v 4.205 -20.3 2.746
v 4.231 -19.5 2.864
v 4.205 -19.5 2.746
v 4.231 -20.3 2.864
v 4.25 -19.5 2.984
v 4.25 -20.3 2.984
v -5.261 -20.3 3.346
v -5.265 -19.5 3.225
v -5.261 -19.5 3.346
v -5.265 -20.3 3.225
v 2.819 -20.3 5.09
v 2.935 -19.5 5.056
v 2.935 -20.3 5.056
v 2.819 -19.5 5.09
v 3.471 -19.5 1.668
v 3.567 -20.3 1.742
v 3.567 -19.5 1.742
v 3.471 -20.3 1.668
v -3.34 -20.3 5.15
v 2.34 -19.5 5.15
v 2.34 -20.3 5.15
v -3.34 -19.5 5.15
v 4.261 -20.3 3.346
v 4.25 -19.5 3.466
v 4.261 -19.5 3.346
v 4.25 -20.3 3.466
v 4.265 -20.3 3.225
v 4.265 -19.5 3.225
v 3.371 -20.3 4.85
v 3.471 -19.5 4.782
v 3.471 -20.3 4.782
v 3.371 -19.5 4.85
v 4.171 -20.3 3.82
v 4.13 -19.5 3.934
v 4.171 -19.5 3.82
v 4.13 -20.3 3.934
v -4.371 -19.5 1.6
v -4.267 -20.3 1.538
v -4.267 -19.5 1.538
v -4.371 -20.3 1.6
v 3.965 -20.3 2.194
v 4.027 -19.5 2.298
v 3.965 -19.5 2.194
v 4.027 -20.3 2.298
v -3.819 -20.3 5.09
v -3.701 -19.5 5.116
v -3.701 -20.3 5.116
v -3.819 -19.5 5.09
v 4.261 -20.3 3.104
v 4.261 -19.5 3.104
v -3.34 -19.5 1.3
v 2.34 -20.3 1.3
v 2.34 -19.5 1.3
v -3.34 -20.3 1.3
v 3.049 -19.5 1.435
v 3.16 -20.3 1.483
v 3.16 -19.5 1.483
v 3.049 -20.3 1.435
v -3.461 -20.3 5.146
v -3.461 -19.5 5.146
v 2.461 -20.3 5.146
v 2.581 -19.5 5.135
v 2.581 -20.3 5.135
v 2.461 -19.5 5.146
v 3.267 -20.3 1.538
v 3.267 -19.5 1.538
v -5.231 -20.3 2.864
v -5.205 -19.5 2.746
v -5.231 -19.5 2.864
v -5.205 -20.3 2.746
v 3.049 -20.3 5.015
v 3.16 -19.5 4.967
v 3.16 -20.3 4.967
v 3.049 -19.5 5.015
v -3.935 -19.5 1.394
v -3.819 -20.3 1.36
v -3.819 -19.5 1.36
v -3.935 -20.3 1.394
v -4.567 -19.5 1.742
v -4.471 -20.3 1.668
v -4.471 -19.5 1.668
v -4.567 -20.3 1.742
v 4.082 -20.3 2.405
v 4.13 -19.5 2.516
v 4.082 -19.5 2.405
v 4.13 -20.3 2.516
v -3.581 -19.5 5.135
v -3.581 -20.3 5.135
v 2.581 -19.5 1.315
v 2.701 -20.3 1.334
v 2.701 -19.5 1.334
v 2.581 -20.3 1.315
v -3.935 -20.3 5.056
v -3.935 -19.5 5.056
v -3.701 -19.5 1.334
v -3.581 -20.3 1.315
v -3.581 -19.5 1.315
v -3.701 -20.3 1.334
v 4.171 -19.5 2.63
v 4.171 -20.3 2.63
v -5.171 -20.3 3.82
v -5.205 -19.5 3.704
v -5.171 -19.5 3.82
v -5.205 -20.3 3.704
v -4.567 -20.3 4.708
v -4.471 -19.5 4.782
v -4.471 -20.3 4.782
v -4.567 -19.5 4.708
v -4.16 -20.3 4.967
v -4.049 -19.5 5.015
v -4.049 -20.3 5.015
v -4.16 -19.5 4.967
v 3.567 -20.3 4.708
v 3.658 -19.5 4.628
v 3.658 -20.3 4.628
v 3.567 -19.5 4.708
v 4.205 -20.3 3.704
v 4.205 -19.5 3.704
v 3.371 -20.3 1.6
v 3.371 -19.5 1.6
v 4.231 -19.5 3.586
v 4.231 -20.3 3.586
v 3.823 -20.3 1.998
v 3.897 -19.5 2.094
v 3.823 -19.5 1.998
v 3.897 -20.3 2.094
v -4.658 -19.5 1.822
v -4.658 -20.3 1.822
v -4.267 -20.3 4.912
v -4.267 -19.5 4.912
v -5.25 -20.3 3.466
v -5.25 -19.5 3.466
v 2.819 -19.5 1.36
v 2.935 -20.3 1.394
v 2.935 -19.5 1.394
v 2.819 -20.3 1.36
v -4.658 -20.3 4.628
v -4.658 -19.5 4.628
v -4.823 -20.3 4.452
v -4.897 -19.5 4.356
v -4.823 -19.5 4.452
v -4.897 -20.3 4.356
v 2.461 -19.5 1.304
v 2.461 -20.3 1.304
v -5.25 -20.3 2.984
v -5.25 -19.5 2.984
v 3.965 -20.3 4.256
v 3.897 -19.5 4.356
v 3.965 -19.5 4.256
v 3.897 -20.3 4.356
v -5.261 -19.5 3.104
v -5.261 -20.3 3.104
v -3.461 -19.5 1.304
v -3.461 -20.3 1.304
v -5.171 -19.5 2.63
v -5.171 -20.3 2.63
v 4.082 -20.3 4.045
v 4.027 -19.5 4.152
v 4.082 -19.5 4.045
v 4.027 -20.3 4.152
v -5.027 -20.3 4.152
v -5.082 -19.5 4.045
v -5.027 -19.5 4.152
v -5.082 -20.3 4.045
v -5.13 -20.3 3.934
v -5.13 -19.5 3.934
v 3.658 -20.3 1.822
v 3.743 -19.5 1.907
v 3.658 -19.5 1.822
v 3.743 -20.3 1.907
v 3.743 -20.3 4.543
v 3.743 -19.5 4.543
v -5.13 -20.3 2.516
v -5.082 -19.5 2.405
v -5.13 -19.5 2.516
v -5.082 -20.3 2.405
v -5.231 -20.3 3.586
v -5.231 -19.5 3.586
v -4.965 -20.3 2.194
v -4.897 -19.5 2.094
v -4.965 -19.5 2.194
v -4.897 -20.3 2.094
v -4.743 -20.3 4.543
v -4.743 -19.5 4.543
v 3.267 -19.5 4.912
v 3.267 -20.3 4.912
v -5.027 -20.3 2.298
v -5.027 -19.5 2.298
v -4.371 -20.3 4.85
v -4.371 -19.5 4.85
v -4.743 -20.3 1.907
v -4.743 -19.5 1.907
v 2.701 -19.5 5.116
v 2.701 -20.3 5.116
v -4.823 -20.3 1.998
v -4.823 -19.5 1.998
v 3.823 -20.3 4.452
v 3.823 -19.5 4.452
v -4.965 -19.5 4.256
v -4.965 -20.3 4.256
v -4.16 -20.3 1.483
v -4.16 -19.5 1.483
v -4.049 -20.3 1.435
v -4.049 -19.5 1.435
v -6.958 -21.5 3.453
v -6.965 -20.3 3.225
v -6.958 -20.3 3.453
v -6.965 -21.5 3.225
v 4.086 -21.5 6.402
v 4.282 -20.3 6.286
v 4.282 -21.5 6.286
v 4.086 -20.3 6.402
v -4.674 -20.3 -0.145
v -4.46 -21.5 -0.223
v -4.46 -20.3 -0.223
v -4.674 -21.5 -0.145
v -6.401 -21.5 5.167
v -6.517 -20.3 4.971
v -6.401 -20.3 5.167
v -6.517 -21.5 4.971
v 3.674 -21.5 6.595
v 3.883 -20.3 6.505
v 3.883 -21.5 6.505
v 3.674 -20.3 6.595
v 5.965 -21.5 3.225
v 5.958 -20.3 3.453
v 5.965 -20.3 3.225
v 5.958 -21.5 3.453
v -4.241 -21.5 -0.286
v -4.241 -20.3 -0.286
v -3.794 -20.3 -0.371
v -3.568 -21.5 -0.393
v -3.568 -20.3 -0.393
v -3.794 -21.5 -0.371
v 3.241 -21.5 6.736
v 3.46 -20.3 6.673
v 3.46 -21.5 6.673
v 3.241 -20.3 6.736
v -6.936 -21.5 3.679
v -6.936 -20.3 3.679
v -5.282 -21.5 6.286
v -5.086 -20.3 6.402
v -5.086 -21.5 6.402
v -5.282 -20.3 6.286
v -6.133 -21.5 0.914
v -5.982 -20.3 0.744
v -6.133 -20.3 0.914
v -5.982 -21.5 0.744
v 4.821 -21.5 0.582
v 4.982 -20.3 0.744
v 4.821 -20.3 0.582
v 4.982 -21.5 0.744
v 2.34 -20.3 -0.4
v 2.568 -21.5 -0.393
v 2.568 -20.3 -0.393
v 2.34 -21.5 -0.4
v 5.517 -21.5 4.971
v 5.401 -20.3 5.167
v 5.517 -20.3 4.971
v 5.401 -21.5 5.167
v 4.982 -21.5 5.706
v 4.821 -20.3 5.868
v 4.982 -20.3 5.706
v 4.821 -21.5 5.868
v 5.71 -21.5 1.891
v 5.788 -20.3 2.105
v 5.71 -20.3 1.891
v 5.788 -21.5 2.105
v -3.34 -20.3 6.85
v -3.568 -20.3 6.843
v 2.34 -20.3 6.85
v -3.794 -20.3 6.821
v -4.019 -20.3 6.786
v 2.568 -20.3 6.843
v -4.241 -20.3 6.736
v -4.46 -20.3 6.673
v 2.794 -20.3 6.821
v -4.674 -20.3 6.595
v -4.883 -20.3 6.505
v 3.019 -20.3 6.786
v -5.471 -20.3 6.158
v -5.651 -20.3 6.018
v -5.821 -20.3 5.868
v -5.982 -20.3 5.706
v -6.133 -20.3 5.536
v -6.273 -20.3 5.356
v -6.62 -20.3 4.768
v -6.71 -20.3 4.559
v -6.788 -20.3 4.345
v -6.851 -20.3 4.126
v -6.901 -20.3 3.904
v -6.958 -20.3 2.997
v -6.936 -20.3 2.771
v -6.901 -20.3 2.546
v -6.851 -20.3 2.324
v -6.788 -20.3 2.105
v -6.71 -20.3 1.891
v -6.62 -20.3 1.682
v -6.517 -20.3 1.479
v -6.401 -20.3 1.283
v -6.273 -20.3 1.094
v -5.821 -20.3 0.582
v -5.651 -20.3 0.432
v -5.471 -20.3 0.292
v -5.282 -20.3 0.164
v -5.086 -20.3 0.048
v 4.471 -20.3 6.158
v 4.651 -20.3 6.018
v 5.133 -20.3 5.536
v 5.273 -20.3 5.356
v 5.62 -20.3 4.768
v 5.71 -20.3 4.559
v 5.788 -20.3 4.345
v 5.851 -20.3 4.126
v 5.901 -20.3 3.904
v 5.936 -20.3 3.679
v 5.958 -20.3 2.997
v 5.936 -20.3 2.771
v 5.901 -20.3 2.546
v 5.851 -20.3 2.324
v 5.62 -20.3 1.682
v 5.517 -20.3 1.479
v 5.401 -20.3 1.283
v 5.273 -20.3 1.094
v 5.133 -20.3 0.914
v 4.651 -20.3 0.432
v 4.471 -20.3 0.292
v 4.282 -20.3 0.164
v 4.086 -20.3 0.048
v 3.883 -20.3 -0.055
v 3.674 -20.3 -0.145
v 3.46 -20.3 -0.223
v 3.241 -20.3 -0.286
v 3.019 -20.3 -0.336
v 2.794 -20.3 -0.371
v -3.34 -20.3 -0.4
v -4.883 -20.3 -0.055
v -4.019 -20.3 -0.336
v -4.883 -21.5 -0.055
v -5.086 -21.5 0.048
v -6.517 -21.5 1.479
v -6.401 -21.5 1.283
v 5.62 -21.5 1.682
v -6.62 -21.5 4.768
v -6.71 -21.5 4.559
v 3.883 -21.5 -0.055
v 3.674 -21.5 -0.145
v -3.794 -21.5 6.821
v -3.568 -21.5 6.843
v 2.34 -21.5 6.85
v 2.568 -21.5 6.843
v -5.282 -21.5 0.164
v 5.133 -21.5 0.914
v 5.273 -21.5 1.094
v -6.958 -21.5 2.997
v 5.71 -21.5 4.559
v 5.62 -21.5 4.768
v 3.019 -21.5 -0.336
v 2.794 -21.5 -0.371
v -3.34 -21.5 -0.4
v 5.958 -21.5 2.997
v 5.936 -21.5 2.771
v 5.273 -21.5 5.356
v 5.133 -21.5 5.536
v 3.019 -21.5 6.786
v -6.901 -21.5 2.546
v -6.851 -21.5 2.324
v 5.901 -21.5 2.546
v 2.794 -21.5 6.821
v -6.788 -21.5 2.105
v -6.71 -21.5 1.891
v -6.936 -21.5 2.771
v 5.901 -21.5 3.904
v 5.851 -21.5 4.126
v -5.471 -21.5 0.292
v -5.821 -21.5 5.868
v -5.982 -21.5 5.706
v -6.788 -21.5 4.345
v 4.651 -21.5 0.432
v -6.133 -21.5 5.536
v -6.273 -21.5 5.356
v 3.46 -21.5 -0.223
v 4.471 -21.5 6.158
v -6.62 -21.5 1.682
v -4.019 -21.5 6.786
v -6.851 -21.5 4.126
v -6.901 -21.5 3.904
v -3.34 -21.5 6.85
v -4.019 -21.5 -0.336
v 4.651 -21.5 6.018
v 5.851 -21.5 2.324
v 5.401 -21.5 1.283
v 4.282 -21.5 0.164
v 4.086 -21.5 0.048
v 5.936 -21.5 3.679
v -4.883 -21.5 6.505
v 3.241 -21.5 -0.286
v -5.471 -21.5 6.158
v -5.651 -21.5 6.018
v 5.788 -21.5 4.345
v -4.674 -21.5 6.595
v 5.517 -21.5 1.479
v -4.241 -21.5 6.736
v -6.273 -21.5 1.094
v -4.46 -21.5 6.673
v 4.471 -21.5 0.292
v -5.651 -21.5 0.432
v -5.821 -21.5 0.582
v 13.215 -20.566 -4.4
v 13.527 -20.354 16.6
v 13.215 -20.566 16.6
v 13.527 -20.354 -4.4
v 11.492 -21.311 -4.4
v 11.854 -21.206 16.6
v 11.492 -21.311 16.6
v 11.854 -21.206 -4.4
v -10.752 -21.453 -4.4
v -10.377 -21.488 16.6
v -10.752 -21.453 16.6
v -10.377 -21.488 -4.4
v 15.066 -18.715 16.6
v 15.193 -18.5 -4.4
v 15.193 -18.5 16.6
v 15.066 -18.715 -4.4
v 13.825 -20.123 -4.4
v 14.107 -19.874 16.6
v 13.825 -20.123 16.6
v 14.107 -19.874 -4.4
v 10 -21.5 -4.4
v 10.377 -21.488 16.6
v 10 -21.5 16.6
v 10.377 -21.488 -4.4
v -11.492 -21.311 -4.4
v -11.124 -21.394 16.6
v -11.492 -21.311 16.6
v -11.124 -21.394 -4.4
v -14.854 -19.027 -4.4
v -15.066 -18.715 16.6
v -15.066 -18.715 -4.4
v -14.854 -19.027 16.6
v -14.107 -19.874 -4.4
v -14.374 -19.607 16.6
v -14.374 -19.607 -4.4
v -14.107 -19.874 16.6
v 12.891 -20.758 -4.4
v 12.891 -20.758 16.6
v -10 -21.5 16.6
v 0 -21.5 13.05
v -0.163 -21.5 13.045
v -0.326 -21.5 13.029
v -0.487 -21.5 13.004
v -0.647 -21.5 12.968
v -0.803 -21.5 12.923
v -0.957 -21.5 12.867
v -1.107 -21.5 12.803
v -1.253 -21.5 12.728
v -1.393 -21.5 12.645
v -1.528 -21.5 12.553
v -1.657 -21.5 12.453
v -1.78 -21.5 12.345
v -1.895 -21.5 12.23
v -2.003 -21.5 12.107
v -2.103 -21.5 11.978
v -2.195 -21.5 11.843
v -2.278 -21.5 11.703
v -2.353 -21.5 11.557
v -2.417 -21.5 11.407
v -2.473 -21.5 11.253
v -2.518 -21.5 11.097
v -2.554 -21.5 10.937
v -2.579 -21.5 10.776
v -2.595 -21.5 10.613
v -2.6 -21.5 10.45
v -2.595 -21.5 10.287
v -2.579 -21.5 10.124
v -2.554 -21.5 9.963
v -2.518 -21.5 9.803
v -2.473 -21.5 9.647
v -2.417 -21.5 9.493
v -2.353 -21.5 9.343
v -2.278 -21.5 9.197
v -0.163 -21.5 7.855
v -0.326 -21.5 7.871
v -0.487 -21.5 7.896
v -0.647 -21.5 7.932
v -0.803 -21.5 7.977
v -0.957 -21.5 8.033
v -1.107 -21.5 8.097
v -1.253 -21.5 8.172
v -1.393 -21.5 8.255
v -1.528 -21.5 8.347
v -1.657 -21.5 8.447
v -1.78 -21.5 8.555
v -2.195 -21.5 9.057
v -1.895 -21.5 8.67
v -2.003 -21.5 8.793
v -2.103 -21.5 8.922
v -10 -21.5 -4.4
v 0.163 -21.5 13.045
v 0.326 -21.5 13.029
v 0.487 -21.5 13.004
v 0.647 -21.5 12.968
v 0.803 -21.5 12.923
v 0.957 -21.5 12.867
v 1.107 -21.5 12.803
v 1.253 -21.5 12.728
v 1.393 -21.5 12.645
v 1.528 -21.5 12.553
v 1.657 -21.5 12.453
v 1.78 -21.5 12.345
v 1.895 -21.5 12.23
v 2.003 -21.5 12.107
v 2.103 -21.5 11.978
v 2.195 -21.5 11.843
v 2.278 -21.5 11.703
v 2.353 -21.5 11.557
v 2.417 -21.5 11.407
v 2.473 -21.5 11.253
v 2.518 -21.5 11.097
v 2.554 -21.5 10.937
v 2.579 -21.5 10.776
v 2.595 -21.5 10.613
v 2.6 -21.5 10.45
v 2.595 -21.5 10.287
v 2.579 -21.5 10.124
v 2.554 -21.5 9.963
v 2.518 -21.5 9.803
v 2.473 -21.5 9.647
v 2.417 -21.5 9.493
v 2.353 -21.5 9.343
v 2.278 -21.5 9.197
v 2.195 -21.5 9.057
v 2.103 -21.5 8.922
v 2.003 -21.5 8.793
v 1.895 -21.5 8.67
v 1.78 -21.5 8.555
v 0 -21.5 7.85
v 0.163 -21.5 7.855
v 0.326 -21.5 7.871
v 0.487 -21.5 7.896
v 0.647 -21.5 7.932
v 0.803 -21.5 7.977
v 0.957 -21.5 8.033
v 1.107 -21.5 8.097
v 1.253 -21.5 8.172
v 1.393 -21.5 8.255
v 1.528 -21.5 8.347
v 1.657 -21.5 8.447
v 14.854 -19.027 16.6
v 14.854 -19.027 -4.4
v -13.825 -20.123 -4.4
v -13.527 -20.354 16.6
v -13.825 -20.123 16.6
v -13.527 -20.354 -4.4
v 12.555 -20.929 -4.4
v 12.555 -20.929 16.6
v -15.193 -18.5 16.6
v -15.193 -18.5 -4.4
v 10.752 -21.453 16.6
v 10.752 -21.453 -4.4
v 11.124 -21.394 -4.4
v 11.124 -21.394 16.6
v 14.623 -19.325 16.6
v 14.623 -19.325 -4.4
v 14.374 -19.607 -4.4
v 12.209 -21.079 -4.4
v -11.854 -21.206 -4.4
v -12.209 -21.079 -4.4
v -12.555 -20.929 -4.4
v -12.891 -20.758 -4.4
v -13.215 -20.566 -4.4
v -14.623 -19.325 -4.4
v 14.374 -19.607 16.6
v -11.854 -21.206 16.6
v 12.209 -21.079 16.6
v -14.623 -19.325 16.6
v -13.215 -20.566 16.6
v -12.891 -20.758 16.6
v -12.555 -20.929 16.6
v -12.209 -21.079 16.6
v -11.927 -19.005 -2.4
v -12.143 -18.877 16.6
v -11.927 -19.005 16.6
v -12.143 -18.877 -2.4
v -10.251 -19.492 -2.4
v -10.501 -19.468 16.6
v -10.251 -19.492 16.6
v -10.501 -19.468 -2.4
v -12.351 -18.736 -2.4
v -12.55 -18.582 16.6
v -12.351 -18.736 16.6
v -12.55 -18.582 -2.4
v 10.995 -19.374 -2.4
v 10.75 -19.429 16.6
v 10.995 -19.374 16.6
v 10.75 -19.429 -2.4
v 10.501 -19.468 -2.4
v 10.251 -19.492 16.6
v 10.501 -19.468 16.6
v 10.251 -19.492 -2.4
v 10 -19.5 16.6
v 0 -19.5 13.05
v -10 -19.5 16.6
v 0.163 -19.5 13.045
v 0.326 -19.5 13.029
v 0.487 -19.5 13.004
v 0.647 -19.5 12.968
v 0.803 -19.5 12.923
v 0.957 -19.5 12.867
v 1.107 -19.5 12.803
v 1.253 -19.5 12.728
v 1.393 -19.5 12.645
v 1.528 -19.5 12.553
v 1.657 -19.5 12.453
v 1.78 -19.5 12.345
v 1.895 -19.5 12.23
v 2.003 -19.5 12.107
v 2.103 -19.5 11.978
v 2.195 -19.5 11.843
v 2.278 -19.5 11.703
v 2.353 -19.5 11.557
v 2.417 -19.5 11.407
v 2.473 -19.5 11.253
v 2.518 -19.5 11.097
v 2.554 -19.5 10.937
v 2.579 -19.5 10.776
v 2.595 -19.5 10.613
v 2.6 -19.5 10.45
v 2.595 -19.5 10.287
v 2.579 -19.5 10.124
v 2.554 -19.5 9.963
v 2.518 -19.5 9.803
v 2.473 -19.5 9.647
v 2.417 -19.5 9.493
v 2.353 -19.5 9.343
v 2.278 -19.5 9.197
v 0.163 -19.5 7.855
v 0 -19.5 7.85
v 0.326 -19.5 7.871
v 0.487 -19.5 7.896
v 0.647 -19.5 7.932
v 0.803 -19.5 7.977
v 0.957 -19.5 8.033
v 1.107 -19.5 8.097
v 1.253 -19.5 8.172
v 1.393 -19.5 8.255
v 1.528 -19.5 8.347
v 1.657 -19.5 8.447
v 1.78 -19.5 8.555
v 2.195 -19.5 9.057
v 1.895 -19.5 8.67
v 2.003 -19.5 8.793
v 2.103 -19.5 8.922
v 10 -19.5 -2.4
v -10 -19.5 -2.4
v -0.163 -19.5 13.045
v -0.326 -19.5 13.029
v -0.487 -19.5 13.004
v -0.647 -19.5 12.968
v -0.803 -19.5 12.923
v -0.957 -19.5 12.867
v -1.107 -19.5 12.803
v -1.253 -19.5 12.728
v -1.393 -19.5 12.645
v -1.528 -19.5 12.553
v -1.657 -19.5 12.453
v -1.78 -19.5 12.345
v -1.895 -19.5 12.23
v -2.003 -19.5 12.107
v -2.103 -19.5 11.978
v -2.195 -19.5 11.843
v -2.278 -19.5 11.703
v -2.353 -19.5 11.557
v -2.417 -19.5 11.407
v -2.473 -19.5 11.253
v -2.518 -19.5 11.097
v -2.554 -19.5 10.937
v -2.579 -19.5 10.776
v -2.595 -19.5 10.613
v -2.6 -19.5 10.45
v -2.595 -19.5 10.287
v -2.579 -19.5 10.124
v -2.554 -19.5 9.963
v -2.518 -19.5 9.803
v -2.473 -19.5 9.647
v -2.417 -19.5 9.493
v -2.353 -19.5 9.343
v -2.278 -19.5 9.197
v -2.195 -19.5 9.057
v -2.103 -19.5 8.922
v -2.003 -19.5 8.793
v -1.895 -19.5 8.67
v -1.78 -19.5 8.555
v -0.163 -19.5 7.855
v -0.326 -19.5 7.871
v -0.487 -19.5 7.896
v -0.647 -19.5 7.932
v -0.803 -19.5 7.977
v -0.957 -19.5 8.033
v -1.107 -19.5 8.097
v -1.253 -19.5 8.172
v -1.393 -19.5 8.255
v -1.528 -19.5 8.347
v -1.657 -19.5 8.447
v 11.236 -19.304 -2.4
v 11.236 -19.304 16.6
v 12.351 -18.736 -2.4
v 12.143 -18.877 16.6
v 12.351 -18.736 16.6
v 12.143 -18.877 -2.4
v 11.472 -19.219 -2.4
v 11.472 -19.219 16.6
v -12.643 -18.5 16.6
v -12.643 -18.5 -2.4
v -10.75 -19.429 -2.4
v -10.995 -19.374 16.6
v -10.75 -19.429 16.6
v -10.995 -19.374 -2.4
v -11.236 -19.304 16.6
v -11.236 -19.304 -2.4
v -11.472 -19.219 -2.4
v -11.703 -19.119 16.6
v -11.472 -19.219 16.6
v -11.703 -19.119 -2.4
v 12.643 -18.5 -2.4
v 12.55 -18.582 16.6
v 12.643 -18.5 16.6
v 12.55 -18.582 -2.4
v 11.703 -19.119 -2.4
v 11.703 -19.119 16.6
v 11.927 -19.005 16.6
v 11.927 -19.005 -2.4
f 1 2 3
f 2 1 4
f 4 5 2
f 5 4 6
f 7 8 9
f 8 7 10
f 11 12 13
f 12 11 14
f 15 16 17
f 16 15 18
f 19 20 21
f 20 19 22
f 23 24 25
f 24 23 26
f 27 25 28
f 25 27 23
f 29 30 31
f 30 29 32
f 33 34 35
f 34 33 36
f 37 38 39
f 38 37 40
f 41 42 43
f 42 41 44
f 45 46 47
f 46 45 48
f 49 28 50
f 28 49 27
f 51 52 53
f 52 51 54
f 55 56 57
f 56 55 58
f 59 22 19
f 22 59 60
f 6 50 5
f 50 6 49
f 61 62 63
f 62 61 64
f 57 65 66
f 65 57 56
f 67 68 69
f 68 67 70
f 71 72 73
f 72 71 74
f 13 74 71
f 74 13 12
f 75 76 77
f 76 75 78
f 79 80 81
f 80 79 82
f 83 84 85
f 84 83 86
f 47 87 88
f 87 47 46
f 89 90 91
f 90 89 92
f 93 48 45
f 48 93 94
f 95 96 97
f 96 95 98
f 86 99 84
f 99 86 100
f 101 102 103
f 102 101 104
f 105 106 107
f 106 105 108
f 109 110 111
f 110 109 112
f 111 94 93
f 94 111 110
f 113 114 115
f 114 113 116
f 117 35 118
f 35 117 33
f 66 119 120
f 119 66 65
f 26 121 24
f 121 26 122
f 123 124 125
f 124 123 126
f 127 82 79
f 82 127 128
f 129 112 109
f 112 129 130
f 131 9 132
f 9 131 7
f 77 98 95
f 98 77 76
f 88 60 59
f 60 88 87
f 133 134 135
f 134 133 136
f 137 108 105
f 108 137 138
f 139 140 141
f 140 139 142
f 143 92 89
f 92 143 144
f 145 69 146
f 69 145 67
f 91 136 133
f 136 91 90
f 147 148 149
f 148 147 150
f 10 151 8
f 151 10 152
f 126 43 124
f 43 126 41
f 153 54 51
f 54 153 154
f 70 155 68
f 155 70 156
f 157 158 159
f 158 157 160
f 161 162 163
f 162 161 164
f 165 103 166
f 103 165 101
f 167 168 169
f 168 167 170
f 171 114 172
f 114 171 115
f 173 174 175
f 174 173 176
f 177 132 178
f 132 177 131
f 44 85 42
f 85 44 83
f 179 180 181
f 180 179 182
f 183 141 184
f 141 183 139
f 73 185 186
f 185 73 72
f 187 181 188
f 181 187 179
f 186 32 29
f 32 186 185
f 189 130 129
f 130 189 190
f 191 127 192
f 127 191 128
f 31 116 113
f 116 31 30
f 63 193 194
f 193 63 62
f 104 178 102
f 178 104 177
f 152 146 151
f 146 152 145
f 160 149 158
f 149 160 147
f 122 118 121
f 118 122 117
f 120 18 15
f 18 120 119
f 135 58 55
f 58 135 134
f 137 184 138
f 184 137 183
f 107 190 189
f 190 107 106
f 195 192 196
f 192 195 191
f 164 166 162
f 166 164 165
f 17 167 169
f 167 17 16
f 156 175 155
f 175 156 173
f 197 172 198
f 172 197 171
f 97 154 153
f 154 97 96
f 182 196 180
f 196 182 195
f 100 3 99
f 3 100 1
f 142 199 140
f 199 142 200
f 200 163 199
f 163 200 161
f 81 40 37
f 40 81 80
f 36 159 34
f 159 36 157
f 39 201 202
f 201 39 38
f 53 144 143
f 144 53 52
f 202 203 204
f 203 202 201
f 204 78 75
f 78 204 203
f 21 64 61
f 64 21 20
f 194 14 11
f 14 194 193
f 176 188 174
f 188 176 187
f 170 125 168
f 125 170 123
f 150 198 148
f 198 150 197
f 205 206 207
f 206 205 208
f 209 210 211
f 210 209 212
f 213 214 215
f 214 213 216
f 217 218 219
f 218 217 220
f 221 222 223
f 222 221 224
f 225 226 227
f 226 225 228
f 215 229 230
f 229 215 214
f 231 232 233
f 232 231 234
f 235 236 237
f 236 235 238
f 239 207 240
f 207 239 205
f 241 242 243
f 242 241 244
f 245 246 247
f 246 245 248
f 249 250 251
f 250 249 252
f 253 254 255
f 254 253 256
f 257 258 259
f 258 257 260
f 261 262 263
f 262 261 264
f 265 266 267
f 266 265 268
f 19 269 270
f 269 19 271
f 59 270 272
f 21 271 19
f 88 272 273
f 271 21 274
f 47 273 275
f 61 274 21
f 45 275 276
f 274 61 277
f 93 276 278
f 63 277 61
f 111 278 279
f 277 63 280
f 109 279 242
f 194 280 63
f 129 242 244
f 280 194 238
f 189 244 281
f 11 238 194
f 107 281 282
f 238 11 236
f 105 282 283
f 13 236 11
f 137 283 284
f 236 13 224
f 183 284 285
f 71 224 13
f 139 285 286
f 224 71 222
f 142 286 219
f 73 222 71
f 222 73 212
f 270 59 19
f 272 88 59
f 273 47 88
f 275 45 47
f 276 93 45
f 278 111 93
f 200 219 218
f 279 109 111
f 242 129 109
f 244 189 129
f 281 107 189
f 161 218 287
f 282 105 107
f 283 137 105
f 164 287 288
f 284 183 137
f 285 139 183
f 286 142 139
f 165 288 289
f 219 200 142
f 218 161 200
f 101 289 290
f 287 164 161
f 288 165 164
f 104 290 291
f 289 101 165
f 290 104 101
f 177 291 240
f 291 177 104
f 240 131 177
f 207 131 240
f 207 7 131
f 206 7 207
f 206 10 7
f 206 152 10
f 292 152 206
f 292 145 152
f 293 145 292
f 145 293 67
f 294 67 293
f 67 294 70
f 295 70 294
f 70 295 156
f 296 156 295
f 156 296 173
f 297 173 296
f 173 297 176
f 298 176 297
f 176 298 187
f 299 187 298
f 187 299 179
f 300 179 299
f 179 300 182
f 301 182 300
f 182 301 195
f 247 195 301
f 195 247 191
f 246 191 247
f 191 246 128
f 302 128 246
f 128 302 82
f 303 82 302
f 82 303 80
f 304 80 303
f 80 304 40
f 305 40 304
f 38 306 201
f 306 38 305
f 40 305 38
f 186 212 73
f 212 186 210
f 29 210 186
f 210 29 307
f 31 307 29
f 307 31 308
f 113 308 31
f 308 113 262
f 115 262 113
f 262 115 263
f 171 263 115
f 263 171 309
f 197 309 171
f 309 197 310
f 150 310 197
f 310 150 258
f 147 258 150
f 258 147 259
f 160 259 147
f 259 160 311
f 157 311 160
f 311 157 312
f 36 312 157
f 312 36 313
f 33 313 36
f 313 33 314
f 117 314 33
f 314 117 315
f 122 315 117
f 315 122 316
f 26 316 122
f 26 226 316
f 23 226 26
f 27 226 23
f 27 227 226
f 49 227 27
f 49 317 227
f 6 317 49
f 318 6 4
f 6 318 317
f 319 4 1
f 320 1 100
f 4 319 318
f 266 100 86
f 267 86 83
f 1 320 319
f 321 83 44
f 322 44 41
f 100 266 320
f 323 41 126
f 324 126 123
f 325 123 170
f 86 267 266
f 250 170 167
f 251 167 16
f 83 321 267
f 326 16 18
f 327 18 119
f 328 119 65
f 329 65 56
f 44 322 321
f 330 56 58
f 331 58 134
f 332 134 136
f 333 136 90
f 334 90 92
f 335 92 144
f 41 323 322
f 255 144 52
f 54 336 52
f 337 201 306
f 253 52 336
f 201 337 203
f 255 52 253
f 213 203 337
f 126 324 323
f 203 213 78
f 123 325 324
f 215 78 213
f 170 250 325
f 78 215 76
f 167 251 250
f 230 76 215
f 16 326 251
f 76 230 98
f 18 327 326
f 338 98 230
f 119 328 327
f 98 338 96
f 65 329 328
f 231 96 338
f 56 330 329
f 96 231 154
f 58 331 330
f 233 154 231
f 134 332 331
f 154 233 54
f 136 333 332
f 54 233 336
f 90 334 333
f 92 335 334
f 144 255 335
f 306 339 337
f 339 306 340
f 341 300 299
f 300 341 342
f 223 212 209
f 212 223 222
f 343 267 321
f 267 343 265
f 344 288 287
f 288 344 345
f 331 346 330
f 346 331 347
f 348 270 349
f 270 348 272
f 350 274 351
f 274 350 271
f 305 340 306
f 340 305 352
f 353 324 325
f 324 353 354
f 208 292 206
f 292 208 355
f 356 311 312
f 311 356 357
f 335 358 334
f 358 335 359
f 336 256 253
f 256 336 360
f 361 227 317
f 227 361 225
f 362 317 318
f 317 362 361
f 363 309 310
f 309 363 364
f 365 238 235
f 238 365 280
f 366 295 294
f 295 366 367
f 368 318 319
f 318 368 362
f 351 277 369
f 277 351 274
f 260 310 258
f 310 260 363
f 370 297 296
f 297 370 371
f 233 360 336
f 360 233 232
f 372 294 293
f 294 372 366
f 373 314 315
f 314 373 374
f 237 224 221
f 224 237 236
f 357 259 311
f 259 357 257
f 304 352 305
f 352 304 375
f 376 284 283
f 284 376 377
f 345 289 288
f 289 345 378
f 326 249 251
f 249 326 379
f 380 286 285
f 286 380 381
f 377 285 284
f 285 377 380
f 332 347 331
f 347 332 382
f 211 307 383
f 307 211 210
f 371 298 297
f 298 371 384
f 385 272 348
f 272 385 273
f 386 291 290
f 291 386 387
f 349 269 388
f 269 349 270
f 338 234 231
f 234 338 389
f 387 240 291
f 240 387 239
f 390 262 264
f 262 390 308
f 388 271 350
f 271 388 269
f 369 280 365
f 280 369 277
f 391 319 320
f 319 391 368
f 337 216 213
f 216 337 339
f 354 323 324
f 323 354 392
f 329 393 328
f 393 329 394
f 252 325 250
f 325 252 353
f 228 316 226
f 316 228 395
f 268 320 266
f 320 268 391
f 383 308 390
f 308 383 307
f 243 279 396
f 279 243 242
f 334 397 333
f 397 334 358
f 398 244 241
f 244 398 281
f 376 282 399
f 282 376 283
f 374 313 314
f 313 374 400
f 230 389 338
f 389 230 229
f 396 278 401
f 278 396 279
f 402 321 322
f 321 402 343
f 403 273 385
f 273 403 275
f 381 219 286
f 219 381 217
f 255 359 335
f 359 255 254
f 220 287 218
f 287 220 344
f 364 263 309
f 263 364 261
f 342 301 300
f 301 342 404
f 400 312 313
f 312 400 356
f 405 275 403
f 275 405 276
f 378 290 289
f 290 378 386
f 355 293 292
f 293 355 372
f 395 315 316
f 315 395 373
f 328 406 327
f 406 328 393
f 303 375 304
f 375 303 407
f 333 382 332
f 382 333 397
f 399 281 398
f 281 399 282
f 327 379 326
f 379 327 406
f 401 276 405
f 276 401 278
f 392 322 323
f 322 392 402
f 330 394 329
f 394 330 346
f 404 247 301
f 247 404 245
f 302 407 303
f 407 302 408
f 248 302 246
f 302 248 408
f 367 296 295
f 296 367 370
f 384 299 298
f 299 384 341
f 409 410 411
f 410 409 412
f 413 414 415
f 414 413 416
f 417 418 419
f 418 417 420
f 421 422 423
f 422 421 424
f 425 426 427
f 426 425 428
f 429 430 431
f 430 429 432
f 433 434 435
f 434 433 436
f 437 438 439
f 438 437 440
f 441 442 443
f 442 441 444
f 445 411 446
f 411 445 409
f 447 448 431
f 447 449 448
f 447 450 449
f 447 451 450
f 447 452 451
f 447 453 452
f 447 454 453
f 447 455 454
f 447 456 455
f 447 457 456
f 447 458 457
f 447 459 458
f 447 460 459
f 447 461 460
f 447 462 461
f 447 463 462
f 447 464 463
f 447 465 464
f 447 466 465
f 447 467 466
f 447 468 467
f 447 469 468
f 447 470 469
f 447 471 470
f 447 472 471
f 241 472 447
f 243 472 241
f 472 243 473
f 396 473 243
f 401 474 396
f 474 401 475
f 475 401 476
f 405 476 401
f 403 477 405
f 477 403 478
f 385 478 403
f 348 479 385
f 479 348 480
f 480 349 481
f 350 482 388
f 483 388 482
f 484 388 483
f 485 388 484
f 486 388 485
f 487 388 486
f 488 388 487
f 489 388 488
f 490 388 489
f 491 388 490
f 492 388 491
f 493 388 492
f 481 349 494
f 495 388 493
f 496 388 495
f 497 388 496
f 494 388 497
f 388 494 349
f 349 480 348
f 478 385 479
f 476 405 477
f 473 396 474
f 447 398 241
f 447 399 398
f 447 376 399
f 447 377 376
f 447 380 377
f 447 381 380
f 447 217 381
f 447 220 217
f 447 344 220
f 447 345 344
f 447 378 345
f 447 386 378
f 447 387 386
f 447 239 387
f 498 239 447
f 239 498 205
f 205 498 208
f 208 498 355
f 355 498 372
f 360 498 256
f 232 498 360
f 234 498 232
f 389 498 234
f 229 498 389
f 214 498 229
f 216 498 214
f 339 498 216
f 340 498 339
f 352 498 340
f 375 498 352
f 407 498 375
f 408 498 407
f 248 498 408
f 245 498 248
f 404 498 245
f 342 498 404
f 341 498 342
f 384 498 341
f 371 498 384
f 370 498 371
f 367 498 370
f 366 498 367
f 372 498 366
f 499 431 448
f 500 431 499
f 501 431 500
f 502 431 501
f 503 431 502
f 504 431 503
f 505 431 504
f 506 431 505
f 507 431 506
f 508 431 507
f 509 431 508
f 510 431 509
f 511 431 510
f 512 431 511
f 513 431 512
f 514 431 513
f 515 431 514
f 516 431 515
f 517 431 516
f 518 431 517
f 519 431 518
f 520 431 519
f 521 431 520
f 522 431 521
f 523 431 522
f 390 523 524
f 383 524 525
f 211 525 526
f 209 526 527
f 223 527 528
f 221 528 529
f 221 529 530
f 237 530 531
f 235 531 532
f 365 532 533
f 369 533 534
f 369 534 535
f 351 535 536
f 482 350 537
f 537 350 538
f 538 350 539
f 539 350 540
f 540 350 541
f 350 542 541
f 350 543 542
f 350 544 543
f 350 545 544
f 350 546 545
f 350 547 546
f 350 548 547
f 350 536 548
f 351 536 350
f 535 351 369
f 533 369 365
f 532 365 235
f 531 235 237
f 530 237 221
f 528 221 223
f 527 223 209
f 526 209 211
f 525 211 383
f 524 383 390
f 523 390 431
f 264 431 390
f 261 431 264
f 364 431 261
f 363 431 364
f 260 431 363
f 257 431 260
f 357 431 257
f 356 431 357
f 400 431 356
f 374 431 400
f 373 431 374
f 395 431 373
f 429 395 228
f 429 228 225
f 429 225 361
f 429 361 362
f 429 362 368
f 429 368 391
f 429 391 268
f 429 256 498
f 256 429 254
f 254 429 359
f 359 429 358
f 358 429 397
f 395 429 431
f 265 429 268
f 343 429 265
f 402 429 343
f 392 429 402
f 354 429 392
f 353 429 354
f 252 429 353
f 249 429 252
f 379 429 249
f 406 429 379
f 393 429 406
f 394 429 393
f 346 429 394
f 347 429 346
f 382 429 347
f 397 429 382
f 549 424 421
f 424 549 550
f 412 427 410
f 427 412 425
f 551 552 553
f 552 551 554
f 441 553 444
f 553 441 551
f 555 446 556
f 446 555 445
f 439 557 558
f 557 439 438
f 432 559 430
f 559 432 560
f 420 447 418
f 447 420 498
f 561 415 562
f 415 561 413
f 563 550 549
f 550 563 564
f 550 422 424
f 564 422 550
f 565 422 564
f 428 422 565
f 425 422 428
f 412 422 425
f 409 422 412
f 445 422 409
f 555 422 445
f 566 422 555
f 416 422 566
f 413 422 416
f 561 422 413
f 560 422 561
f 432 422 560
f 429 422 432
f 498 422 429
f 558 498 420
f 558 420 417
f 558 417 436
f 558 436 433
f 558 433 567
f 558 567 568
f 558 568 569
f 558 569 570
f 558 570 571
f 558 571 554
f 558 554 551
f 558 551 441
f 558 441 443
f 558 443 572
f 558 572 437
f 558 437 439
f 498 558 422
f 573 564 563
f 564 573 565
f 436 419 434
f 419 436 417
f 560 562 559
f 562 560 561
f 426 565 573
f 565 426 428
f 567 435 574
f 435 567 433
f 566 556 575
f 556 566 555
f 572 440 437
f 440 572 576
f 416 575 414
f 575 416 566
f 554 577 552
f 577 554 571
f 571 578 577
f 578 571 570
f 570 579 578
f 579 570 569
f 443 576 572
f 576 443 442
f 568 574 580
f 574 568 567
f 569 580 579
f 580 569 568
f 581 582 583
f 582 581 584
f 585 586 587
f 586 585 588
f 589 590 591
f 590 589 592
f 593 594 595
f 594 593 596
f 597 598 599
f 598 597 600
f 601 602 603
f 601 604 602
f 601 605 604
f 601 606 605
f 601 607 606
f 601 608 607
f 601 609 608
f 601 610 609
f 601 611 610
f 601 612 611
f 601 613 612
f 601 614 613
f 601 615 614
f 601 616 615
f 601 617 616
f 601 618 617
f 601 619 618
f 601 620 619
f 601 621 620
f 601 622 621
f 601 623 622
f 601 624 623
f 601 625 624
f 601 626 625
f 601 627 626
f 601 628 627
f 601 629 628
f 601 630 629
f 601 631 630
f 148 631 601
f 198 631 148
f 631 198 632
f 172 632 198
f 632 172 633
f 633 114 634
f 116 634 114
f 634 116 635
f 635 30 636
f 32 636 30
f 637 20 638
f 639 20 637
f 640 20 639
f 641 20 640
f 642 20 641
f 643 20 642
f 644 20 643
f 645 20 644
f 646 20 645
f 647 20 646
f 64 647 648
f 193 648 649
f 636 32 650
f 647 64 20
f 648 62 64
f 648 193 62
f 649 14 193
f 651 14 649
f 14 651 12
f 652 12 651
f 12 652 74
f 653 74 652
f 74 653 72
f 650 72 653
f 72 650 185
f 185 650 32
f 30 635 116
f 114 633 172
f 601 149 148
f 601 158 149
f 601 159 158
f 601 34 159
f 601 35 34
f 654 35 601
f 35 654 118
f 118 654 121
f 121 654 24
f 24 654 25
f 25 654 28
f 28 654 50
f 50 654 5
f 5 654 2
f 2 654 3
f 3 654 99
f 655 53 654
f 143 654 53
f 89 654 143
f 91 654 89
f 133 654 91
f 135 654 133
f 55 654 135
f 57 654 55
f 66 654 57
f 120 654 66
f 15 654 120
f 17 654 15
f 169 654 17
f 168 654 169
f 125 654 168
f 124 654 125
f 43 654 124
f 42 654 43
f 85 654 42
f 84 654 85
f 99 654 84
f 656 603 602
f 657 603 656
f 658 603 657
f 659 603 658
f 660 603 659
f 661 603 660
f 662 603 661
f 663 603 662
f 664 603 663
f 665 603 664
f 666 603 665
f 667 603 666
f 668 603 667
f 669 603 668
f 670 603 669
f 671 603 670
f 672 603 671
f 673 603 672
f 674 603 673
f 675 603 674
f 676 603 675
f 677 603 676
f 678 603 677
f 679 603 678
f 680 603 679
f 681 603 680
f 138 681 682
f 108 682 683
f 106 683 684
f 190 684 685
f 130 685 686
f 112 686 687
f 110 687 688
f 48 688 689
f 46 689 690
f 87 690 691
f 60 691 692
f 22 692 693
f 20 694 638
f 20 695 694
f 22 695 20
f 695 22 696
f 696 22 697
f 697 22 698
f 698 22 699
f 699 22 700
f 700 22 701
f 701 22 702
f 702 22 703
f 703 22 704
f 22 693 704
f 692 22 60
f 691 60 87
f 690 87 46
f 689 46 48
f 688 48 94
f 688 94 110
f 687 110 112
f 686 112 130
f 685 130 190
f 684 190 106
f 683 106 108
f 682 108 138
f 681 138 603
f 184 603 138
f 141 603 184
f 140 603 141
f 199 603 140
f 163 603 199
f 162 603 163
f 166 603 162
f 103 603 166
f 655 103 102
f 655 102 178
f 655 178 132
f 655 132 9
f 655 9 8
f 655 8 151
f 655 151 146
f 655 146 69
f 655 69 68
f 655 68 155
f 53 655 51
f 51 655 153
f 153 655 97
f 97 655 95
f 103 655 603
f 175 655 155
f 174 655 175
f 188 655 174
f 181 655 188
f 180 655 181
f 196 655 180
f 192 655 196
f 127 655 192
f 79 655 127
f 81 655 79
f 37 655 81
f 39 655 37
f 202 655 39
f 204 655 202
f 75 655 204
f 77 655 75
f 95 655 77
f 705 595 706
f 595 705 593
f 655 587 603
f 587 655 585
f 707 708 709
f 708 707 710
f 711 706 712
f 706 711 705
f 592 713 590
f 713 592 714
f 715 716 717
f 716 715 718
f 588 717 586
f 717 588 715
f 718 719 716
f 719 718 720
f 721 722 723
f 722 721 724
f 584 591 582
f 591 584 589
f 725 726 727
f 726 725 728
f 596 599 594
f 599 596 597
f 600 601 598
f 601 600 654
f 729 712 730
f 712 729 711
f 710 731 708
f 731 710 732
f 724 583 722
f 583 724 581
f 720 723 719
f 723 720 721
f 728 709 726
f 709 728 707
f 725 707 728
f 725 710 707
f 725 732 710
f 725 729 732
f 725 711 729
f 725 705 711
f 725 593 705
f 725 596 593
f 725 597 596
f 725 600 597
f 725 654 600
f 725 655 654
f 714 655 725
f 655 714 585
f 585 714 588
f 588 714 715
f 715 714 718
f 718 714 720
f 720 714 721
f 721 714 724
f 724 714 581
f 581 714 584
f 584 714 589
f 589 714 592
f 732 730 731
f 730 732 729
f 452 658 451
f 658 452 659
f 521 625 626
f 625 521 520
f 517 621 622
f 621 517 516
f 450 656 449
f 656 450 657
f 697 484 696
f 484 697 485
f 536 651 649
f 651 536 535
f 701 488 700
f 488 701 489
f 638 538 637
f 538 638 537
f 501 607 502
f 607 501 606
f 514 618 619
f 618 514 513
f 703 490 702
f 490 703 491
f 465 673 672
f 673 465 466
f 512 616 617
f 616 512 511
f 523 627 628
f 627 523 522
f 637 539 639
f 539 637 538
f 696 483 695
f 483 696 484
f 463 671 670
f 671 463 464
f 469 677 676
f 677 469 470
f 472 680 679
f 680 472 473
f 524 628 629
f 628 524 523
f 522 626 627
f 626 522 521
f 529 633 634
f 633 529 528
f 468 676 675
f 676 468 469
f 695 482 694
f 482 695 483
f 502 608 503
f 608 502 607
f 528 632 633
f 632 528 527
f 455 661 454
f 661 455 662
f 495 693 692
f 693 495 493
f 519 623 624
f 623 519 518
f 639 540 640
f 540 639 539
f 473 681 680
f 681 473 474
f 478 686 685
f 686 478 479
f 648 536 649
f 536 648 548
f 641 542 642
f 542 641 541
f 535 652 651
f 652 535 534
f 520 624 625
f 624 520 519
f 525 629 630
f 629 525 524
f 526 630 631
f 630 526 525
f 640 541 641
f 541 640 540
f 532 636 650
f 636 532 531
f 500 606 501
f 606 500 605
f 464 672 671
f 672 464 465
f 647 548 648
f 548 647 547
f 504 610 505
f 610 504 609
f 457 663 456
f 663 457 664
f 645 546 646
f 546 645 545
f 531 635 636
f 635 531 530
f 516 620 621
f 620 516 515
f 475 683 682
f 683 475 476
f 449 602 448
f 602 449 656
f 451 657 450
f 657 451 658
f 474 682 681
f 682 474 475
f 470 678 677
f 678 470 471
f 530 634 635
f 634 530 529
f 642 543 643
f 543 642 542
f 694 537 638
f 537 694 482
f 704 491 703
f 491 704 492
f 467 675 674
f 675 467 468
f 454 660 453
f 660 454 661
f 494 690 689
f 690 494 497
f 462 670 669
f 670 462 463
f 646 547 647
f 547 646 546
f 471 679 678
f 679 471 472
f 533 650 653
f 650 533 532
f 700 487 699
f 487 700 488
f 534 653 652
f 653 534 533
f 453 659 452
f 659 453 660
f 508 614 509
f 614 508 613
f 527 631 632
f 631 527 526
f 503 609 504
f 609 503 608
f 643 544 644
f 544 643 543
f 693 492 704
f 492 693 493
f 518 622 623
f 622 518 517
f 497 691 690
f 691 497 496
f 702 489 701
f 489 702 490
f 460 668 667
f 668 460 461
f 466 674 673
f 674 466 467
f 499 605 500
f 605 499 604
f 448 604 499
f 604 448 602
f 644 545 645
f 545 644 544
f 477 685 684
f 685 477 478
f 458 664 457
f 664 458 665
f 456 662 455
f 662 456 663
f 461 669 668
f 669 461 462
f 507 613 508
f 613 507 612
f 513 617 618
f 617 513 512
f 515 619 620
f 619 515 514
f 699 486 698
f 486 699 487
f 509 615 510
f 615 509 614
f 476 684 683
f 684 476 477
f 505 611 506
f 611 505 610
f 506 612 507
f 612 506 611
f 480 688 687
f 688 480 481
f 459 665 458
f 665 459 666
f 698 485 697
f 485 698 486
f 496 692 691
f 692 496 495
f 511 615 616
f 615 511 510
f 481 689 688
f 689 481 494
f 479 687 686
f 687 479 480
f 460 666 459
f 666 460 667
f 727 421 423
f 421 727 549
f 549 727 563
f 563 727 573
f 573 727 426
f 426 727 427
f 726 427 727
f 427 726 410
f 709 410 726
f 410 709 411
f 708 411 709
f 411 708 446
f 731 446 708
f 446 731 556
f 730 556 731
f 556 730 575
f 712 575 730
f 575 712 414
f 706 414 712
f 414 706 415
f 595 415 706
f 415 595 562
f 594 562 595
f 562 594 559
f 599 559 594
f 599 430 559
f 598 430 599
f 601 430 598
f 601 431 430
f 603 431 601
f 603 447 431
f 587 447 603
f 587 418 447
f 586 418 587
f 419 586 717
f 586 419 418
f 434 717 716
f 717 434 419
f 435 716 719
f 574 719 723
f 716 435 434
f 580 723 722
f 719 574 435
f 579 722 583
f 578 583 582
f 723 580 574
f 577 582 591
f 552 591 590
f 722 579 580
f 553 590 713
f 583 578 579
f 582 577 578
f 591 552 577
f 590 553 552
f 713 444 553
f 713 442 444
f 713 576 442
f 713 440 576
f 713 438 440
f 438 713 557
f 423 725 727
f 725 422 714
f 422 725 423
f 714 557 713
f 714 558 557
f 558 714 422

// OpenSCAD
$fn=100;

tol=0.05; // used for CSG subtraction/addition

pcb_thickness=1.6;
height_below_pcb=1.4; // 1.32
hole_diameter=3;
hole_radius=hole_diameter/2;
pcb_radius=1.5+hole_radius;

inside_hole_width=17;
inside_hole_length=28;
center_hole_width=inside_hole_width + hole_diameter;
center_hole_length=inside_hole_length + hole_diameter;
gps_height=13;
//gps_width=26; // 25.75
//gps_length=37; // 36.5
gps_width=center_hole_width + (pcb_radius*2);
gps_length=center_hole_length + (pcb_radius*2);

usb_height=3.25;
usb_width=8.93;
usb_length=7.38;
usb_radius=usb_height/2;
usb_center_width=usb_width-usb_height;
usb_overhang=1.45;
usb_offset=0.5;
usb_hole_gap=0.3;
usb_big_hole_radius=usb_radius + 2;
usb_big_hole_offset=0.8;

enclosure_thickness=2;
enclosure_gap_to_pcb=1;
enclosure_radius_inner=pcb_radius+enclosure_gap_to_pcb;
enclosure_radius_outer=enclosure_radius_inner+enclosure_thickness;
antenna_diameter=5.2;
antenna_radius=antenna_diameter/2;
antenna_clearance=3; // space around the antenna connector

enclosure_inside_height_down=enclosure_gap_to_pcb + height_below_pcb;
enclosure_inside_height_up=pcb_thickness + usb_hole_gap + usb_height + usb_hole_gap + antenna_clearance + antenna_diameter + antenna_clearance;
enclosure_inside_height= enclosure_inside_height_up + enclosure_inside_height_down;




module flat_usb(r = usb_radius) {
    for(i=[-1,1])
        translate([i*usb_center_width/2, 0, 0])
            circle(r = r);
}
module usb(r = usb_radius) {
    rotate(90, v = [1, 0, 0])
        linear_extrude(height = usb_length, center = true)
            hull() {
                flat_usb(r);
            }
}

module rounded_rectangle_centered(radius) {
    hull() {
        for(i=[-1,1])
            for(j=[-1,1])
                translate([i*center_hole_width/2,j*center_hole_length/2,0])
                    circle(radius);
    }
}

module flat_pcb() {
    rounded_rectangle_centered(pcb_radius);
}

module pcb_no_holes() {
    translate([0,0,pcb_thickness/2])
        linear_extrude(height = pcb_thickness, center = true)
            flat_pcb();
}

module pcb() {
    difference() {
        pcb_no_holes();
        for(i=[-1,1])
            for(j=[-1,1])
                translate([i*center_hole_width/2,j*center_hole_length/2,0])
                    cylinder(h = height + tol, r = hole_radius, center=true);
    }
}

module board() {
    translate([0,0,(real_height/2)-height_below_pcb])
        cube([10, 20, real_height], center = true);
    pcb();
    translate([-usb_offset,-(length/2)+(usb_length/2)-usb_overhang,pcb_thickness+(usb_height/2)])
        usb();
}

module enclosure_flat_inner() {
    rounded_rectangle_centered(enclosure_radius_inner);
}
module enclosure_flat_outer() {
    rounded_rectangle_centered(enclosure_radius_outer);
}
module enclosure_inner() {
    translate([0,0,-(height_below_pcb + enclosure_gap_to_pcb)])
        linear_extrude(height = enclosure_inside_height /*+ enclosure_gap_to_pcb*2*/)
            rounded_rectangle_centered(enclosure_radius_inner);
}
module enclosure_outer() {
    translate([0,0,-(height_below_pcb + enclosure_gap_to_pcb + enclosure_thickness)])
        linear_extrude(height = enclosure_inside_height + (/*enclosure_gap_to_pcb +*/ enclosure_thickness)*2)
            rounded_rectangle_centered(enclosure_radius_outer);
}

module usb_hole() {
    translate([-usb_offset,-gps_length/2,pcb_thickness+(usb_height/2)])
        usb(r = usb_radius + usb_hole_gap);
    translate([-usb_offset,-gps_length/2 - (usb_length/2 + enclosure_gap_to_pcb + usb_big_hole_offset),pcb_thickness+(usb_height/2)])
        usb(r = usb_big_hole_radius);
}
module antenna_hole() {
    translate([0,-15, pcb_thickness+usb_height+antenna_clearance+antenna_radius])
        rotate(90, v = [1, 0, 0])
            linear_extrude(height = 10)
                circle(r = antenna_radius);
}

module enclosure() {
    difference() {
        enclosure_outer();
        enclosure_inner();
        usb_hole();
        antenna_hole();
    };
}

//color([0.5,0.5,0.5,1]) board();
difference() {
/*color([0.5,0.5,0,0.5])*/ enclosure();
//translate([0,-30,-10]) cube([100,100,100]); // Cut off side
translate([-30,-30,enclosure_inside_height - enclosure_inside_height_down - tol]) cube([100,100,100]); // Cut off top
translate([-30,-gps_length/2,-30]) cube([100,100,100]); // Only leave ports
}
